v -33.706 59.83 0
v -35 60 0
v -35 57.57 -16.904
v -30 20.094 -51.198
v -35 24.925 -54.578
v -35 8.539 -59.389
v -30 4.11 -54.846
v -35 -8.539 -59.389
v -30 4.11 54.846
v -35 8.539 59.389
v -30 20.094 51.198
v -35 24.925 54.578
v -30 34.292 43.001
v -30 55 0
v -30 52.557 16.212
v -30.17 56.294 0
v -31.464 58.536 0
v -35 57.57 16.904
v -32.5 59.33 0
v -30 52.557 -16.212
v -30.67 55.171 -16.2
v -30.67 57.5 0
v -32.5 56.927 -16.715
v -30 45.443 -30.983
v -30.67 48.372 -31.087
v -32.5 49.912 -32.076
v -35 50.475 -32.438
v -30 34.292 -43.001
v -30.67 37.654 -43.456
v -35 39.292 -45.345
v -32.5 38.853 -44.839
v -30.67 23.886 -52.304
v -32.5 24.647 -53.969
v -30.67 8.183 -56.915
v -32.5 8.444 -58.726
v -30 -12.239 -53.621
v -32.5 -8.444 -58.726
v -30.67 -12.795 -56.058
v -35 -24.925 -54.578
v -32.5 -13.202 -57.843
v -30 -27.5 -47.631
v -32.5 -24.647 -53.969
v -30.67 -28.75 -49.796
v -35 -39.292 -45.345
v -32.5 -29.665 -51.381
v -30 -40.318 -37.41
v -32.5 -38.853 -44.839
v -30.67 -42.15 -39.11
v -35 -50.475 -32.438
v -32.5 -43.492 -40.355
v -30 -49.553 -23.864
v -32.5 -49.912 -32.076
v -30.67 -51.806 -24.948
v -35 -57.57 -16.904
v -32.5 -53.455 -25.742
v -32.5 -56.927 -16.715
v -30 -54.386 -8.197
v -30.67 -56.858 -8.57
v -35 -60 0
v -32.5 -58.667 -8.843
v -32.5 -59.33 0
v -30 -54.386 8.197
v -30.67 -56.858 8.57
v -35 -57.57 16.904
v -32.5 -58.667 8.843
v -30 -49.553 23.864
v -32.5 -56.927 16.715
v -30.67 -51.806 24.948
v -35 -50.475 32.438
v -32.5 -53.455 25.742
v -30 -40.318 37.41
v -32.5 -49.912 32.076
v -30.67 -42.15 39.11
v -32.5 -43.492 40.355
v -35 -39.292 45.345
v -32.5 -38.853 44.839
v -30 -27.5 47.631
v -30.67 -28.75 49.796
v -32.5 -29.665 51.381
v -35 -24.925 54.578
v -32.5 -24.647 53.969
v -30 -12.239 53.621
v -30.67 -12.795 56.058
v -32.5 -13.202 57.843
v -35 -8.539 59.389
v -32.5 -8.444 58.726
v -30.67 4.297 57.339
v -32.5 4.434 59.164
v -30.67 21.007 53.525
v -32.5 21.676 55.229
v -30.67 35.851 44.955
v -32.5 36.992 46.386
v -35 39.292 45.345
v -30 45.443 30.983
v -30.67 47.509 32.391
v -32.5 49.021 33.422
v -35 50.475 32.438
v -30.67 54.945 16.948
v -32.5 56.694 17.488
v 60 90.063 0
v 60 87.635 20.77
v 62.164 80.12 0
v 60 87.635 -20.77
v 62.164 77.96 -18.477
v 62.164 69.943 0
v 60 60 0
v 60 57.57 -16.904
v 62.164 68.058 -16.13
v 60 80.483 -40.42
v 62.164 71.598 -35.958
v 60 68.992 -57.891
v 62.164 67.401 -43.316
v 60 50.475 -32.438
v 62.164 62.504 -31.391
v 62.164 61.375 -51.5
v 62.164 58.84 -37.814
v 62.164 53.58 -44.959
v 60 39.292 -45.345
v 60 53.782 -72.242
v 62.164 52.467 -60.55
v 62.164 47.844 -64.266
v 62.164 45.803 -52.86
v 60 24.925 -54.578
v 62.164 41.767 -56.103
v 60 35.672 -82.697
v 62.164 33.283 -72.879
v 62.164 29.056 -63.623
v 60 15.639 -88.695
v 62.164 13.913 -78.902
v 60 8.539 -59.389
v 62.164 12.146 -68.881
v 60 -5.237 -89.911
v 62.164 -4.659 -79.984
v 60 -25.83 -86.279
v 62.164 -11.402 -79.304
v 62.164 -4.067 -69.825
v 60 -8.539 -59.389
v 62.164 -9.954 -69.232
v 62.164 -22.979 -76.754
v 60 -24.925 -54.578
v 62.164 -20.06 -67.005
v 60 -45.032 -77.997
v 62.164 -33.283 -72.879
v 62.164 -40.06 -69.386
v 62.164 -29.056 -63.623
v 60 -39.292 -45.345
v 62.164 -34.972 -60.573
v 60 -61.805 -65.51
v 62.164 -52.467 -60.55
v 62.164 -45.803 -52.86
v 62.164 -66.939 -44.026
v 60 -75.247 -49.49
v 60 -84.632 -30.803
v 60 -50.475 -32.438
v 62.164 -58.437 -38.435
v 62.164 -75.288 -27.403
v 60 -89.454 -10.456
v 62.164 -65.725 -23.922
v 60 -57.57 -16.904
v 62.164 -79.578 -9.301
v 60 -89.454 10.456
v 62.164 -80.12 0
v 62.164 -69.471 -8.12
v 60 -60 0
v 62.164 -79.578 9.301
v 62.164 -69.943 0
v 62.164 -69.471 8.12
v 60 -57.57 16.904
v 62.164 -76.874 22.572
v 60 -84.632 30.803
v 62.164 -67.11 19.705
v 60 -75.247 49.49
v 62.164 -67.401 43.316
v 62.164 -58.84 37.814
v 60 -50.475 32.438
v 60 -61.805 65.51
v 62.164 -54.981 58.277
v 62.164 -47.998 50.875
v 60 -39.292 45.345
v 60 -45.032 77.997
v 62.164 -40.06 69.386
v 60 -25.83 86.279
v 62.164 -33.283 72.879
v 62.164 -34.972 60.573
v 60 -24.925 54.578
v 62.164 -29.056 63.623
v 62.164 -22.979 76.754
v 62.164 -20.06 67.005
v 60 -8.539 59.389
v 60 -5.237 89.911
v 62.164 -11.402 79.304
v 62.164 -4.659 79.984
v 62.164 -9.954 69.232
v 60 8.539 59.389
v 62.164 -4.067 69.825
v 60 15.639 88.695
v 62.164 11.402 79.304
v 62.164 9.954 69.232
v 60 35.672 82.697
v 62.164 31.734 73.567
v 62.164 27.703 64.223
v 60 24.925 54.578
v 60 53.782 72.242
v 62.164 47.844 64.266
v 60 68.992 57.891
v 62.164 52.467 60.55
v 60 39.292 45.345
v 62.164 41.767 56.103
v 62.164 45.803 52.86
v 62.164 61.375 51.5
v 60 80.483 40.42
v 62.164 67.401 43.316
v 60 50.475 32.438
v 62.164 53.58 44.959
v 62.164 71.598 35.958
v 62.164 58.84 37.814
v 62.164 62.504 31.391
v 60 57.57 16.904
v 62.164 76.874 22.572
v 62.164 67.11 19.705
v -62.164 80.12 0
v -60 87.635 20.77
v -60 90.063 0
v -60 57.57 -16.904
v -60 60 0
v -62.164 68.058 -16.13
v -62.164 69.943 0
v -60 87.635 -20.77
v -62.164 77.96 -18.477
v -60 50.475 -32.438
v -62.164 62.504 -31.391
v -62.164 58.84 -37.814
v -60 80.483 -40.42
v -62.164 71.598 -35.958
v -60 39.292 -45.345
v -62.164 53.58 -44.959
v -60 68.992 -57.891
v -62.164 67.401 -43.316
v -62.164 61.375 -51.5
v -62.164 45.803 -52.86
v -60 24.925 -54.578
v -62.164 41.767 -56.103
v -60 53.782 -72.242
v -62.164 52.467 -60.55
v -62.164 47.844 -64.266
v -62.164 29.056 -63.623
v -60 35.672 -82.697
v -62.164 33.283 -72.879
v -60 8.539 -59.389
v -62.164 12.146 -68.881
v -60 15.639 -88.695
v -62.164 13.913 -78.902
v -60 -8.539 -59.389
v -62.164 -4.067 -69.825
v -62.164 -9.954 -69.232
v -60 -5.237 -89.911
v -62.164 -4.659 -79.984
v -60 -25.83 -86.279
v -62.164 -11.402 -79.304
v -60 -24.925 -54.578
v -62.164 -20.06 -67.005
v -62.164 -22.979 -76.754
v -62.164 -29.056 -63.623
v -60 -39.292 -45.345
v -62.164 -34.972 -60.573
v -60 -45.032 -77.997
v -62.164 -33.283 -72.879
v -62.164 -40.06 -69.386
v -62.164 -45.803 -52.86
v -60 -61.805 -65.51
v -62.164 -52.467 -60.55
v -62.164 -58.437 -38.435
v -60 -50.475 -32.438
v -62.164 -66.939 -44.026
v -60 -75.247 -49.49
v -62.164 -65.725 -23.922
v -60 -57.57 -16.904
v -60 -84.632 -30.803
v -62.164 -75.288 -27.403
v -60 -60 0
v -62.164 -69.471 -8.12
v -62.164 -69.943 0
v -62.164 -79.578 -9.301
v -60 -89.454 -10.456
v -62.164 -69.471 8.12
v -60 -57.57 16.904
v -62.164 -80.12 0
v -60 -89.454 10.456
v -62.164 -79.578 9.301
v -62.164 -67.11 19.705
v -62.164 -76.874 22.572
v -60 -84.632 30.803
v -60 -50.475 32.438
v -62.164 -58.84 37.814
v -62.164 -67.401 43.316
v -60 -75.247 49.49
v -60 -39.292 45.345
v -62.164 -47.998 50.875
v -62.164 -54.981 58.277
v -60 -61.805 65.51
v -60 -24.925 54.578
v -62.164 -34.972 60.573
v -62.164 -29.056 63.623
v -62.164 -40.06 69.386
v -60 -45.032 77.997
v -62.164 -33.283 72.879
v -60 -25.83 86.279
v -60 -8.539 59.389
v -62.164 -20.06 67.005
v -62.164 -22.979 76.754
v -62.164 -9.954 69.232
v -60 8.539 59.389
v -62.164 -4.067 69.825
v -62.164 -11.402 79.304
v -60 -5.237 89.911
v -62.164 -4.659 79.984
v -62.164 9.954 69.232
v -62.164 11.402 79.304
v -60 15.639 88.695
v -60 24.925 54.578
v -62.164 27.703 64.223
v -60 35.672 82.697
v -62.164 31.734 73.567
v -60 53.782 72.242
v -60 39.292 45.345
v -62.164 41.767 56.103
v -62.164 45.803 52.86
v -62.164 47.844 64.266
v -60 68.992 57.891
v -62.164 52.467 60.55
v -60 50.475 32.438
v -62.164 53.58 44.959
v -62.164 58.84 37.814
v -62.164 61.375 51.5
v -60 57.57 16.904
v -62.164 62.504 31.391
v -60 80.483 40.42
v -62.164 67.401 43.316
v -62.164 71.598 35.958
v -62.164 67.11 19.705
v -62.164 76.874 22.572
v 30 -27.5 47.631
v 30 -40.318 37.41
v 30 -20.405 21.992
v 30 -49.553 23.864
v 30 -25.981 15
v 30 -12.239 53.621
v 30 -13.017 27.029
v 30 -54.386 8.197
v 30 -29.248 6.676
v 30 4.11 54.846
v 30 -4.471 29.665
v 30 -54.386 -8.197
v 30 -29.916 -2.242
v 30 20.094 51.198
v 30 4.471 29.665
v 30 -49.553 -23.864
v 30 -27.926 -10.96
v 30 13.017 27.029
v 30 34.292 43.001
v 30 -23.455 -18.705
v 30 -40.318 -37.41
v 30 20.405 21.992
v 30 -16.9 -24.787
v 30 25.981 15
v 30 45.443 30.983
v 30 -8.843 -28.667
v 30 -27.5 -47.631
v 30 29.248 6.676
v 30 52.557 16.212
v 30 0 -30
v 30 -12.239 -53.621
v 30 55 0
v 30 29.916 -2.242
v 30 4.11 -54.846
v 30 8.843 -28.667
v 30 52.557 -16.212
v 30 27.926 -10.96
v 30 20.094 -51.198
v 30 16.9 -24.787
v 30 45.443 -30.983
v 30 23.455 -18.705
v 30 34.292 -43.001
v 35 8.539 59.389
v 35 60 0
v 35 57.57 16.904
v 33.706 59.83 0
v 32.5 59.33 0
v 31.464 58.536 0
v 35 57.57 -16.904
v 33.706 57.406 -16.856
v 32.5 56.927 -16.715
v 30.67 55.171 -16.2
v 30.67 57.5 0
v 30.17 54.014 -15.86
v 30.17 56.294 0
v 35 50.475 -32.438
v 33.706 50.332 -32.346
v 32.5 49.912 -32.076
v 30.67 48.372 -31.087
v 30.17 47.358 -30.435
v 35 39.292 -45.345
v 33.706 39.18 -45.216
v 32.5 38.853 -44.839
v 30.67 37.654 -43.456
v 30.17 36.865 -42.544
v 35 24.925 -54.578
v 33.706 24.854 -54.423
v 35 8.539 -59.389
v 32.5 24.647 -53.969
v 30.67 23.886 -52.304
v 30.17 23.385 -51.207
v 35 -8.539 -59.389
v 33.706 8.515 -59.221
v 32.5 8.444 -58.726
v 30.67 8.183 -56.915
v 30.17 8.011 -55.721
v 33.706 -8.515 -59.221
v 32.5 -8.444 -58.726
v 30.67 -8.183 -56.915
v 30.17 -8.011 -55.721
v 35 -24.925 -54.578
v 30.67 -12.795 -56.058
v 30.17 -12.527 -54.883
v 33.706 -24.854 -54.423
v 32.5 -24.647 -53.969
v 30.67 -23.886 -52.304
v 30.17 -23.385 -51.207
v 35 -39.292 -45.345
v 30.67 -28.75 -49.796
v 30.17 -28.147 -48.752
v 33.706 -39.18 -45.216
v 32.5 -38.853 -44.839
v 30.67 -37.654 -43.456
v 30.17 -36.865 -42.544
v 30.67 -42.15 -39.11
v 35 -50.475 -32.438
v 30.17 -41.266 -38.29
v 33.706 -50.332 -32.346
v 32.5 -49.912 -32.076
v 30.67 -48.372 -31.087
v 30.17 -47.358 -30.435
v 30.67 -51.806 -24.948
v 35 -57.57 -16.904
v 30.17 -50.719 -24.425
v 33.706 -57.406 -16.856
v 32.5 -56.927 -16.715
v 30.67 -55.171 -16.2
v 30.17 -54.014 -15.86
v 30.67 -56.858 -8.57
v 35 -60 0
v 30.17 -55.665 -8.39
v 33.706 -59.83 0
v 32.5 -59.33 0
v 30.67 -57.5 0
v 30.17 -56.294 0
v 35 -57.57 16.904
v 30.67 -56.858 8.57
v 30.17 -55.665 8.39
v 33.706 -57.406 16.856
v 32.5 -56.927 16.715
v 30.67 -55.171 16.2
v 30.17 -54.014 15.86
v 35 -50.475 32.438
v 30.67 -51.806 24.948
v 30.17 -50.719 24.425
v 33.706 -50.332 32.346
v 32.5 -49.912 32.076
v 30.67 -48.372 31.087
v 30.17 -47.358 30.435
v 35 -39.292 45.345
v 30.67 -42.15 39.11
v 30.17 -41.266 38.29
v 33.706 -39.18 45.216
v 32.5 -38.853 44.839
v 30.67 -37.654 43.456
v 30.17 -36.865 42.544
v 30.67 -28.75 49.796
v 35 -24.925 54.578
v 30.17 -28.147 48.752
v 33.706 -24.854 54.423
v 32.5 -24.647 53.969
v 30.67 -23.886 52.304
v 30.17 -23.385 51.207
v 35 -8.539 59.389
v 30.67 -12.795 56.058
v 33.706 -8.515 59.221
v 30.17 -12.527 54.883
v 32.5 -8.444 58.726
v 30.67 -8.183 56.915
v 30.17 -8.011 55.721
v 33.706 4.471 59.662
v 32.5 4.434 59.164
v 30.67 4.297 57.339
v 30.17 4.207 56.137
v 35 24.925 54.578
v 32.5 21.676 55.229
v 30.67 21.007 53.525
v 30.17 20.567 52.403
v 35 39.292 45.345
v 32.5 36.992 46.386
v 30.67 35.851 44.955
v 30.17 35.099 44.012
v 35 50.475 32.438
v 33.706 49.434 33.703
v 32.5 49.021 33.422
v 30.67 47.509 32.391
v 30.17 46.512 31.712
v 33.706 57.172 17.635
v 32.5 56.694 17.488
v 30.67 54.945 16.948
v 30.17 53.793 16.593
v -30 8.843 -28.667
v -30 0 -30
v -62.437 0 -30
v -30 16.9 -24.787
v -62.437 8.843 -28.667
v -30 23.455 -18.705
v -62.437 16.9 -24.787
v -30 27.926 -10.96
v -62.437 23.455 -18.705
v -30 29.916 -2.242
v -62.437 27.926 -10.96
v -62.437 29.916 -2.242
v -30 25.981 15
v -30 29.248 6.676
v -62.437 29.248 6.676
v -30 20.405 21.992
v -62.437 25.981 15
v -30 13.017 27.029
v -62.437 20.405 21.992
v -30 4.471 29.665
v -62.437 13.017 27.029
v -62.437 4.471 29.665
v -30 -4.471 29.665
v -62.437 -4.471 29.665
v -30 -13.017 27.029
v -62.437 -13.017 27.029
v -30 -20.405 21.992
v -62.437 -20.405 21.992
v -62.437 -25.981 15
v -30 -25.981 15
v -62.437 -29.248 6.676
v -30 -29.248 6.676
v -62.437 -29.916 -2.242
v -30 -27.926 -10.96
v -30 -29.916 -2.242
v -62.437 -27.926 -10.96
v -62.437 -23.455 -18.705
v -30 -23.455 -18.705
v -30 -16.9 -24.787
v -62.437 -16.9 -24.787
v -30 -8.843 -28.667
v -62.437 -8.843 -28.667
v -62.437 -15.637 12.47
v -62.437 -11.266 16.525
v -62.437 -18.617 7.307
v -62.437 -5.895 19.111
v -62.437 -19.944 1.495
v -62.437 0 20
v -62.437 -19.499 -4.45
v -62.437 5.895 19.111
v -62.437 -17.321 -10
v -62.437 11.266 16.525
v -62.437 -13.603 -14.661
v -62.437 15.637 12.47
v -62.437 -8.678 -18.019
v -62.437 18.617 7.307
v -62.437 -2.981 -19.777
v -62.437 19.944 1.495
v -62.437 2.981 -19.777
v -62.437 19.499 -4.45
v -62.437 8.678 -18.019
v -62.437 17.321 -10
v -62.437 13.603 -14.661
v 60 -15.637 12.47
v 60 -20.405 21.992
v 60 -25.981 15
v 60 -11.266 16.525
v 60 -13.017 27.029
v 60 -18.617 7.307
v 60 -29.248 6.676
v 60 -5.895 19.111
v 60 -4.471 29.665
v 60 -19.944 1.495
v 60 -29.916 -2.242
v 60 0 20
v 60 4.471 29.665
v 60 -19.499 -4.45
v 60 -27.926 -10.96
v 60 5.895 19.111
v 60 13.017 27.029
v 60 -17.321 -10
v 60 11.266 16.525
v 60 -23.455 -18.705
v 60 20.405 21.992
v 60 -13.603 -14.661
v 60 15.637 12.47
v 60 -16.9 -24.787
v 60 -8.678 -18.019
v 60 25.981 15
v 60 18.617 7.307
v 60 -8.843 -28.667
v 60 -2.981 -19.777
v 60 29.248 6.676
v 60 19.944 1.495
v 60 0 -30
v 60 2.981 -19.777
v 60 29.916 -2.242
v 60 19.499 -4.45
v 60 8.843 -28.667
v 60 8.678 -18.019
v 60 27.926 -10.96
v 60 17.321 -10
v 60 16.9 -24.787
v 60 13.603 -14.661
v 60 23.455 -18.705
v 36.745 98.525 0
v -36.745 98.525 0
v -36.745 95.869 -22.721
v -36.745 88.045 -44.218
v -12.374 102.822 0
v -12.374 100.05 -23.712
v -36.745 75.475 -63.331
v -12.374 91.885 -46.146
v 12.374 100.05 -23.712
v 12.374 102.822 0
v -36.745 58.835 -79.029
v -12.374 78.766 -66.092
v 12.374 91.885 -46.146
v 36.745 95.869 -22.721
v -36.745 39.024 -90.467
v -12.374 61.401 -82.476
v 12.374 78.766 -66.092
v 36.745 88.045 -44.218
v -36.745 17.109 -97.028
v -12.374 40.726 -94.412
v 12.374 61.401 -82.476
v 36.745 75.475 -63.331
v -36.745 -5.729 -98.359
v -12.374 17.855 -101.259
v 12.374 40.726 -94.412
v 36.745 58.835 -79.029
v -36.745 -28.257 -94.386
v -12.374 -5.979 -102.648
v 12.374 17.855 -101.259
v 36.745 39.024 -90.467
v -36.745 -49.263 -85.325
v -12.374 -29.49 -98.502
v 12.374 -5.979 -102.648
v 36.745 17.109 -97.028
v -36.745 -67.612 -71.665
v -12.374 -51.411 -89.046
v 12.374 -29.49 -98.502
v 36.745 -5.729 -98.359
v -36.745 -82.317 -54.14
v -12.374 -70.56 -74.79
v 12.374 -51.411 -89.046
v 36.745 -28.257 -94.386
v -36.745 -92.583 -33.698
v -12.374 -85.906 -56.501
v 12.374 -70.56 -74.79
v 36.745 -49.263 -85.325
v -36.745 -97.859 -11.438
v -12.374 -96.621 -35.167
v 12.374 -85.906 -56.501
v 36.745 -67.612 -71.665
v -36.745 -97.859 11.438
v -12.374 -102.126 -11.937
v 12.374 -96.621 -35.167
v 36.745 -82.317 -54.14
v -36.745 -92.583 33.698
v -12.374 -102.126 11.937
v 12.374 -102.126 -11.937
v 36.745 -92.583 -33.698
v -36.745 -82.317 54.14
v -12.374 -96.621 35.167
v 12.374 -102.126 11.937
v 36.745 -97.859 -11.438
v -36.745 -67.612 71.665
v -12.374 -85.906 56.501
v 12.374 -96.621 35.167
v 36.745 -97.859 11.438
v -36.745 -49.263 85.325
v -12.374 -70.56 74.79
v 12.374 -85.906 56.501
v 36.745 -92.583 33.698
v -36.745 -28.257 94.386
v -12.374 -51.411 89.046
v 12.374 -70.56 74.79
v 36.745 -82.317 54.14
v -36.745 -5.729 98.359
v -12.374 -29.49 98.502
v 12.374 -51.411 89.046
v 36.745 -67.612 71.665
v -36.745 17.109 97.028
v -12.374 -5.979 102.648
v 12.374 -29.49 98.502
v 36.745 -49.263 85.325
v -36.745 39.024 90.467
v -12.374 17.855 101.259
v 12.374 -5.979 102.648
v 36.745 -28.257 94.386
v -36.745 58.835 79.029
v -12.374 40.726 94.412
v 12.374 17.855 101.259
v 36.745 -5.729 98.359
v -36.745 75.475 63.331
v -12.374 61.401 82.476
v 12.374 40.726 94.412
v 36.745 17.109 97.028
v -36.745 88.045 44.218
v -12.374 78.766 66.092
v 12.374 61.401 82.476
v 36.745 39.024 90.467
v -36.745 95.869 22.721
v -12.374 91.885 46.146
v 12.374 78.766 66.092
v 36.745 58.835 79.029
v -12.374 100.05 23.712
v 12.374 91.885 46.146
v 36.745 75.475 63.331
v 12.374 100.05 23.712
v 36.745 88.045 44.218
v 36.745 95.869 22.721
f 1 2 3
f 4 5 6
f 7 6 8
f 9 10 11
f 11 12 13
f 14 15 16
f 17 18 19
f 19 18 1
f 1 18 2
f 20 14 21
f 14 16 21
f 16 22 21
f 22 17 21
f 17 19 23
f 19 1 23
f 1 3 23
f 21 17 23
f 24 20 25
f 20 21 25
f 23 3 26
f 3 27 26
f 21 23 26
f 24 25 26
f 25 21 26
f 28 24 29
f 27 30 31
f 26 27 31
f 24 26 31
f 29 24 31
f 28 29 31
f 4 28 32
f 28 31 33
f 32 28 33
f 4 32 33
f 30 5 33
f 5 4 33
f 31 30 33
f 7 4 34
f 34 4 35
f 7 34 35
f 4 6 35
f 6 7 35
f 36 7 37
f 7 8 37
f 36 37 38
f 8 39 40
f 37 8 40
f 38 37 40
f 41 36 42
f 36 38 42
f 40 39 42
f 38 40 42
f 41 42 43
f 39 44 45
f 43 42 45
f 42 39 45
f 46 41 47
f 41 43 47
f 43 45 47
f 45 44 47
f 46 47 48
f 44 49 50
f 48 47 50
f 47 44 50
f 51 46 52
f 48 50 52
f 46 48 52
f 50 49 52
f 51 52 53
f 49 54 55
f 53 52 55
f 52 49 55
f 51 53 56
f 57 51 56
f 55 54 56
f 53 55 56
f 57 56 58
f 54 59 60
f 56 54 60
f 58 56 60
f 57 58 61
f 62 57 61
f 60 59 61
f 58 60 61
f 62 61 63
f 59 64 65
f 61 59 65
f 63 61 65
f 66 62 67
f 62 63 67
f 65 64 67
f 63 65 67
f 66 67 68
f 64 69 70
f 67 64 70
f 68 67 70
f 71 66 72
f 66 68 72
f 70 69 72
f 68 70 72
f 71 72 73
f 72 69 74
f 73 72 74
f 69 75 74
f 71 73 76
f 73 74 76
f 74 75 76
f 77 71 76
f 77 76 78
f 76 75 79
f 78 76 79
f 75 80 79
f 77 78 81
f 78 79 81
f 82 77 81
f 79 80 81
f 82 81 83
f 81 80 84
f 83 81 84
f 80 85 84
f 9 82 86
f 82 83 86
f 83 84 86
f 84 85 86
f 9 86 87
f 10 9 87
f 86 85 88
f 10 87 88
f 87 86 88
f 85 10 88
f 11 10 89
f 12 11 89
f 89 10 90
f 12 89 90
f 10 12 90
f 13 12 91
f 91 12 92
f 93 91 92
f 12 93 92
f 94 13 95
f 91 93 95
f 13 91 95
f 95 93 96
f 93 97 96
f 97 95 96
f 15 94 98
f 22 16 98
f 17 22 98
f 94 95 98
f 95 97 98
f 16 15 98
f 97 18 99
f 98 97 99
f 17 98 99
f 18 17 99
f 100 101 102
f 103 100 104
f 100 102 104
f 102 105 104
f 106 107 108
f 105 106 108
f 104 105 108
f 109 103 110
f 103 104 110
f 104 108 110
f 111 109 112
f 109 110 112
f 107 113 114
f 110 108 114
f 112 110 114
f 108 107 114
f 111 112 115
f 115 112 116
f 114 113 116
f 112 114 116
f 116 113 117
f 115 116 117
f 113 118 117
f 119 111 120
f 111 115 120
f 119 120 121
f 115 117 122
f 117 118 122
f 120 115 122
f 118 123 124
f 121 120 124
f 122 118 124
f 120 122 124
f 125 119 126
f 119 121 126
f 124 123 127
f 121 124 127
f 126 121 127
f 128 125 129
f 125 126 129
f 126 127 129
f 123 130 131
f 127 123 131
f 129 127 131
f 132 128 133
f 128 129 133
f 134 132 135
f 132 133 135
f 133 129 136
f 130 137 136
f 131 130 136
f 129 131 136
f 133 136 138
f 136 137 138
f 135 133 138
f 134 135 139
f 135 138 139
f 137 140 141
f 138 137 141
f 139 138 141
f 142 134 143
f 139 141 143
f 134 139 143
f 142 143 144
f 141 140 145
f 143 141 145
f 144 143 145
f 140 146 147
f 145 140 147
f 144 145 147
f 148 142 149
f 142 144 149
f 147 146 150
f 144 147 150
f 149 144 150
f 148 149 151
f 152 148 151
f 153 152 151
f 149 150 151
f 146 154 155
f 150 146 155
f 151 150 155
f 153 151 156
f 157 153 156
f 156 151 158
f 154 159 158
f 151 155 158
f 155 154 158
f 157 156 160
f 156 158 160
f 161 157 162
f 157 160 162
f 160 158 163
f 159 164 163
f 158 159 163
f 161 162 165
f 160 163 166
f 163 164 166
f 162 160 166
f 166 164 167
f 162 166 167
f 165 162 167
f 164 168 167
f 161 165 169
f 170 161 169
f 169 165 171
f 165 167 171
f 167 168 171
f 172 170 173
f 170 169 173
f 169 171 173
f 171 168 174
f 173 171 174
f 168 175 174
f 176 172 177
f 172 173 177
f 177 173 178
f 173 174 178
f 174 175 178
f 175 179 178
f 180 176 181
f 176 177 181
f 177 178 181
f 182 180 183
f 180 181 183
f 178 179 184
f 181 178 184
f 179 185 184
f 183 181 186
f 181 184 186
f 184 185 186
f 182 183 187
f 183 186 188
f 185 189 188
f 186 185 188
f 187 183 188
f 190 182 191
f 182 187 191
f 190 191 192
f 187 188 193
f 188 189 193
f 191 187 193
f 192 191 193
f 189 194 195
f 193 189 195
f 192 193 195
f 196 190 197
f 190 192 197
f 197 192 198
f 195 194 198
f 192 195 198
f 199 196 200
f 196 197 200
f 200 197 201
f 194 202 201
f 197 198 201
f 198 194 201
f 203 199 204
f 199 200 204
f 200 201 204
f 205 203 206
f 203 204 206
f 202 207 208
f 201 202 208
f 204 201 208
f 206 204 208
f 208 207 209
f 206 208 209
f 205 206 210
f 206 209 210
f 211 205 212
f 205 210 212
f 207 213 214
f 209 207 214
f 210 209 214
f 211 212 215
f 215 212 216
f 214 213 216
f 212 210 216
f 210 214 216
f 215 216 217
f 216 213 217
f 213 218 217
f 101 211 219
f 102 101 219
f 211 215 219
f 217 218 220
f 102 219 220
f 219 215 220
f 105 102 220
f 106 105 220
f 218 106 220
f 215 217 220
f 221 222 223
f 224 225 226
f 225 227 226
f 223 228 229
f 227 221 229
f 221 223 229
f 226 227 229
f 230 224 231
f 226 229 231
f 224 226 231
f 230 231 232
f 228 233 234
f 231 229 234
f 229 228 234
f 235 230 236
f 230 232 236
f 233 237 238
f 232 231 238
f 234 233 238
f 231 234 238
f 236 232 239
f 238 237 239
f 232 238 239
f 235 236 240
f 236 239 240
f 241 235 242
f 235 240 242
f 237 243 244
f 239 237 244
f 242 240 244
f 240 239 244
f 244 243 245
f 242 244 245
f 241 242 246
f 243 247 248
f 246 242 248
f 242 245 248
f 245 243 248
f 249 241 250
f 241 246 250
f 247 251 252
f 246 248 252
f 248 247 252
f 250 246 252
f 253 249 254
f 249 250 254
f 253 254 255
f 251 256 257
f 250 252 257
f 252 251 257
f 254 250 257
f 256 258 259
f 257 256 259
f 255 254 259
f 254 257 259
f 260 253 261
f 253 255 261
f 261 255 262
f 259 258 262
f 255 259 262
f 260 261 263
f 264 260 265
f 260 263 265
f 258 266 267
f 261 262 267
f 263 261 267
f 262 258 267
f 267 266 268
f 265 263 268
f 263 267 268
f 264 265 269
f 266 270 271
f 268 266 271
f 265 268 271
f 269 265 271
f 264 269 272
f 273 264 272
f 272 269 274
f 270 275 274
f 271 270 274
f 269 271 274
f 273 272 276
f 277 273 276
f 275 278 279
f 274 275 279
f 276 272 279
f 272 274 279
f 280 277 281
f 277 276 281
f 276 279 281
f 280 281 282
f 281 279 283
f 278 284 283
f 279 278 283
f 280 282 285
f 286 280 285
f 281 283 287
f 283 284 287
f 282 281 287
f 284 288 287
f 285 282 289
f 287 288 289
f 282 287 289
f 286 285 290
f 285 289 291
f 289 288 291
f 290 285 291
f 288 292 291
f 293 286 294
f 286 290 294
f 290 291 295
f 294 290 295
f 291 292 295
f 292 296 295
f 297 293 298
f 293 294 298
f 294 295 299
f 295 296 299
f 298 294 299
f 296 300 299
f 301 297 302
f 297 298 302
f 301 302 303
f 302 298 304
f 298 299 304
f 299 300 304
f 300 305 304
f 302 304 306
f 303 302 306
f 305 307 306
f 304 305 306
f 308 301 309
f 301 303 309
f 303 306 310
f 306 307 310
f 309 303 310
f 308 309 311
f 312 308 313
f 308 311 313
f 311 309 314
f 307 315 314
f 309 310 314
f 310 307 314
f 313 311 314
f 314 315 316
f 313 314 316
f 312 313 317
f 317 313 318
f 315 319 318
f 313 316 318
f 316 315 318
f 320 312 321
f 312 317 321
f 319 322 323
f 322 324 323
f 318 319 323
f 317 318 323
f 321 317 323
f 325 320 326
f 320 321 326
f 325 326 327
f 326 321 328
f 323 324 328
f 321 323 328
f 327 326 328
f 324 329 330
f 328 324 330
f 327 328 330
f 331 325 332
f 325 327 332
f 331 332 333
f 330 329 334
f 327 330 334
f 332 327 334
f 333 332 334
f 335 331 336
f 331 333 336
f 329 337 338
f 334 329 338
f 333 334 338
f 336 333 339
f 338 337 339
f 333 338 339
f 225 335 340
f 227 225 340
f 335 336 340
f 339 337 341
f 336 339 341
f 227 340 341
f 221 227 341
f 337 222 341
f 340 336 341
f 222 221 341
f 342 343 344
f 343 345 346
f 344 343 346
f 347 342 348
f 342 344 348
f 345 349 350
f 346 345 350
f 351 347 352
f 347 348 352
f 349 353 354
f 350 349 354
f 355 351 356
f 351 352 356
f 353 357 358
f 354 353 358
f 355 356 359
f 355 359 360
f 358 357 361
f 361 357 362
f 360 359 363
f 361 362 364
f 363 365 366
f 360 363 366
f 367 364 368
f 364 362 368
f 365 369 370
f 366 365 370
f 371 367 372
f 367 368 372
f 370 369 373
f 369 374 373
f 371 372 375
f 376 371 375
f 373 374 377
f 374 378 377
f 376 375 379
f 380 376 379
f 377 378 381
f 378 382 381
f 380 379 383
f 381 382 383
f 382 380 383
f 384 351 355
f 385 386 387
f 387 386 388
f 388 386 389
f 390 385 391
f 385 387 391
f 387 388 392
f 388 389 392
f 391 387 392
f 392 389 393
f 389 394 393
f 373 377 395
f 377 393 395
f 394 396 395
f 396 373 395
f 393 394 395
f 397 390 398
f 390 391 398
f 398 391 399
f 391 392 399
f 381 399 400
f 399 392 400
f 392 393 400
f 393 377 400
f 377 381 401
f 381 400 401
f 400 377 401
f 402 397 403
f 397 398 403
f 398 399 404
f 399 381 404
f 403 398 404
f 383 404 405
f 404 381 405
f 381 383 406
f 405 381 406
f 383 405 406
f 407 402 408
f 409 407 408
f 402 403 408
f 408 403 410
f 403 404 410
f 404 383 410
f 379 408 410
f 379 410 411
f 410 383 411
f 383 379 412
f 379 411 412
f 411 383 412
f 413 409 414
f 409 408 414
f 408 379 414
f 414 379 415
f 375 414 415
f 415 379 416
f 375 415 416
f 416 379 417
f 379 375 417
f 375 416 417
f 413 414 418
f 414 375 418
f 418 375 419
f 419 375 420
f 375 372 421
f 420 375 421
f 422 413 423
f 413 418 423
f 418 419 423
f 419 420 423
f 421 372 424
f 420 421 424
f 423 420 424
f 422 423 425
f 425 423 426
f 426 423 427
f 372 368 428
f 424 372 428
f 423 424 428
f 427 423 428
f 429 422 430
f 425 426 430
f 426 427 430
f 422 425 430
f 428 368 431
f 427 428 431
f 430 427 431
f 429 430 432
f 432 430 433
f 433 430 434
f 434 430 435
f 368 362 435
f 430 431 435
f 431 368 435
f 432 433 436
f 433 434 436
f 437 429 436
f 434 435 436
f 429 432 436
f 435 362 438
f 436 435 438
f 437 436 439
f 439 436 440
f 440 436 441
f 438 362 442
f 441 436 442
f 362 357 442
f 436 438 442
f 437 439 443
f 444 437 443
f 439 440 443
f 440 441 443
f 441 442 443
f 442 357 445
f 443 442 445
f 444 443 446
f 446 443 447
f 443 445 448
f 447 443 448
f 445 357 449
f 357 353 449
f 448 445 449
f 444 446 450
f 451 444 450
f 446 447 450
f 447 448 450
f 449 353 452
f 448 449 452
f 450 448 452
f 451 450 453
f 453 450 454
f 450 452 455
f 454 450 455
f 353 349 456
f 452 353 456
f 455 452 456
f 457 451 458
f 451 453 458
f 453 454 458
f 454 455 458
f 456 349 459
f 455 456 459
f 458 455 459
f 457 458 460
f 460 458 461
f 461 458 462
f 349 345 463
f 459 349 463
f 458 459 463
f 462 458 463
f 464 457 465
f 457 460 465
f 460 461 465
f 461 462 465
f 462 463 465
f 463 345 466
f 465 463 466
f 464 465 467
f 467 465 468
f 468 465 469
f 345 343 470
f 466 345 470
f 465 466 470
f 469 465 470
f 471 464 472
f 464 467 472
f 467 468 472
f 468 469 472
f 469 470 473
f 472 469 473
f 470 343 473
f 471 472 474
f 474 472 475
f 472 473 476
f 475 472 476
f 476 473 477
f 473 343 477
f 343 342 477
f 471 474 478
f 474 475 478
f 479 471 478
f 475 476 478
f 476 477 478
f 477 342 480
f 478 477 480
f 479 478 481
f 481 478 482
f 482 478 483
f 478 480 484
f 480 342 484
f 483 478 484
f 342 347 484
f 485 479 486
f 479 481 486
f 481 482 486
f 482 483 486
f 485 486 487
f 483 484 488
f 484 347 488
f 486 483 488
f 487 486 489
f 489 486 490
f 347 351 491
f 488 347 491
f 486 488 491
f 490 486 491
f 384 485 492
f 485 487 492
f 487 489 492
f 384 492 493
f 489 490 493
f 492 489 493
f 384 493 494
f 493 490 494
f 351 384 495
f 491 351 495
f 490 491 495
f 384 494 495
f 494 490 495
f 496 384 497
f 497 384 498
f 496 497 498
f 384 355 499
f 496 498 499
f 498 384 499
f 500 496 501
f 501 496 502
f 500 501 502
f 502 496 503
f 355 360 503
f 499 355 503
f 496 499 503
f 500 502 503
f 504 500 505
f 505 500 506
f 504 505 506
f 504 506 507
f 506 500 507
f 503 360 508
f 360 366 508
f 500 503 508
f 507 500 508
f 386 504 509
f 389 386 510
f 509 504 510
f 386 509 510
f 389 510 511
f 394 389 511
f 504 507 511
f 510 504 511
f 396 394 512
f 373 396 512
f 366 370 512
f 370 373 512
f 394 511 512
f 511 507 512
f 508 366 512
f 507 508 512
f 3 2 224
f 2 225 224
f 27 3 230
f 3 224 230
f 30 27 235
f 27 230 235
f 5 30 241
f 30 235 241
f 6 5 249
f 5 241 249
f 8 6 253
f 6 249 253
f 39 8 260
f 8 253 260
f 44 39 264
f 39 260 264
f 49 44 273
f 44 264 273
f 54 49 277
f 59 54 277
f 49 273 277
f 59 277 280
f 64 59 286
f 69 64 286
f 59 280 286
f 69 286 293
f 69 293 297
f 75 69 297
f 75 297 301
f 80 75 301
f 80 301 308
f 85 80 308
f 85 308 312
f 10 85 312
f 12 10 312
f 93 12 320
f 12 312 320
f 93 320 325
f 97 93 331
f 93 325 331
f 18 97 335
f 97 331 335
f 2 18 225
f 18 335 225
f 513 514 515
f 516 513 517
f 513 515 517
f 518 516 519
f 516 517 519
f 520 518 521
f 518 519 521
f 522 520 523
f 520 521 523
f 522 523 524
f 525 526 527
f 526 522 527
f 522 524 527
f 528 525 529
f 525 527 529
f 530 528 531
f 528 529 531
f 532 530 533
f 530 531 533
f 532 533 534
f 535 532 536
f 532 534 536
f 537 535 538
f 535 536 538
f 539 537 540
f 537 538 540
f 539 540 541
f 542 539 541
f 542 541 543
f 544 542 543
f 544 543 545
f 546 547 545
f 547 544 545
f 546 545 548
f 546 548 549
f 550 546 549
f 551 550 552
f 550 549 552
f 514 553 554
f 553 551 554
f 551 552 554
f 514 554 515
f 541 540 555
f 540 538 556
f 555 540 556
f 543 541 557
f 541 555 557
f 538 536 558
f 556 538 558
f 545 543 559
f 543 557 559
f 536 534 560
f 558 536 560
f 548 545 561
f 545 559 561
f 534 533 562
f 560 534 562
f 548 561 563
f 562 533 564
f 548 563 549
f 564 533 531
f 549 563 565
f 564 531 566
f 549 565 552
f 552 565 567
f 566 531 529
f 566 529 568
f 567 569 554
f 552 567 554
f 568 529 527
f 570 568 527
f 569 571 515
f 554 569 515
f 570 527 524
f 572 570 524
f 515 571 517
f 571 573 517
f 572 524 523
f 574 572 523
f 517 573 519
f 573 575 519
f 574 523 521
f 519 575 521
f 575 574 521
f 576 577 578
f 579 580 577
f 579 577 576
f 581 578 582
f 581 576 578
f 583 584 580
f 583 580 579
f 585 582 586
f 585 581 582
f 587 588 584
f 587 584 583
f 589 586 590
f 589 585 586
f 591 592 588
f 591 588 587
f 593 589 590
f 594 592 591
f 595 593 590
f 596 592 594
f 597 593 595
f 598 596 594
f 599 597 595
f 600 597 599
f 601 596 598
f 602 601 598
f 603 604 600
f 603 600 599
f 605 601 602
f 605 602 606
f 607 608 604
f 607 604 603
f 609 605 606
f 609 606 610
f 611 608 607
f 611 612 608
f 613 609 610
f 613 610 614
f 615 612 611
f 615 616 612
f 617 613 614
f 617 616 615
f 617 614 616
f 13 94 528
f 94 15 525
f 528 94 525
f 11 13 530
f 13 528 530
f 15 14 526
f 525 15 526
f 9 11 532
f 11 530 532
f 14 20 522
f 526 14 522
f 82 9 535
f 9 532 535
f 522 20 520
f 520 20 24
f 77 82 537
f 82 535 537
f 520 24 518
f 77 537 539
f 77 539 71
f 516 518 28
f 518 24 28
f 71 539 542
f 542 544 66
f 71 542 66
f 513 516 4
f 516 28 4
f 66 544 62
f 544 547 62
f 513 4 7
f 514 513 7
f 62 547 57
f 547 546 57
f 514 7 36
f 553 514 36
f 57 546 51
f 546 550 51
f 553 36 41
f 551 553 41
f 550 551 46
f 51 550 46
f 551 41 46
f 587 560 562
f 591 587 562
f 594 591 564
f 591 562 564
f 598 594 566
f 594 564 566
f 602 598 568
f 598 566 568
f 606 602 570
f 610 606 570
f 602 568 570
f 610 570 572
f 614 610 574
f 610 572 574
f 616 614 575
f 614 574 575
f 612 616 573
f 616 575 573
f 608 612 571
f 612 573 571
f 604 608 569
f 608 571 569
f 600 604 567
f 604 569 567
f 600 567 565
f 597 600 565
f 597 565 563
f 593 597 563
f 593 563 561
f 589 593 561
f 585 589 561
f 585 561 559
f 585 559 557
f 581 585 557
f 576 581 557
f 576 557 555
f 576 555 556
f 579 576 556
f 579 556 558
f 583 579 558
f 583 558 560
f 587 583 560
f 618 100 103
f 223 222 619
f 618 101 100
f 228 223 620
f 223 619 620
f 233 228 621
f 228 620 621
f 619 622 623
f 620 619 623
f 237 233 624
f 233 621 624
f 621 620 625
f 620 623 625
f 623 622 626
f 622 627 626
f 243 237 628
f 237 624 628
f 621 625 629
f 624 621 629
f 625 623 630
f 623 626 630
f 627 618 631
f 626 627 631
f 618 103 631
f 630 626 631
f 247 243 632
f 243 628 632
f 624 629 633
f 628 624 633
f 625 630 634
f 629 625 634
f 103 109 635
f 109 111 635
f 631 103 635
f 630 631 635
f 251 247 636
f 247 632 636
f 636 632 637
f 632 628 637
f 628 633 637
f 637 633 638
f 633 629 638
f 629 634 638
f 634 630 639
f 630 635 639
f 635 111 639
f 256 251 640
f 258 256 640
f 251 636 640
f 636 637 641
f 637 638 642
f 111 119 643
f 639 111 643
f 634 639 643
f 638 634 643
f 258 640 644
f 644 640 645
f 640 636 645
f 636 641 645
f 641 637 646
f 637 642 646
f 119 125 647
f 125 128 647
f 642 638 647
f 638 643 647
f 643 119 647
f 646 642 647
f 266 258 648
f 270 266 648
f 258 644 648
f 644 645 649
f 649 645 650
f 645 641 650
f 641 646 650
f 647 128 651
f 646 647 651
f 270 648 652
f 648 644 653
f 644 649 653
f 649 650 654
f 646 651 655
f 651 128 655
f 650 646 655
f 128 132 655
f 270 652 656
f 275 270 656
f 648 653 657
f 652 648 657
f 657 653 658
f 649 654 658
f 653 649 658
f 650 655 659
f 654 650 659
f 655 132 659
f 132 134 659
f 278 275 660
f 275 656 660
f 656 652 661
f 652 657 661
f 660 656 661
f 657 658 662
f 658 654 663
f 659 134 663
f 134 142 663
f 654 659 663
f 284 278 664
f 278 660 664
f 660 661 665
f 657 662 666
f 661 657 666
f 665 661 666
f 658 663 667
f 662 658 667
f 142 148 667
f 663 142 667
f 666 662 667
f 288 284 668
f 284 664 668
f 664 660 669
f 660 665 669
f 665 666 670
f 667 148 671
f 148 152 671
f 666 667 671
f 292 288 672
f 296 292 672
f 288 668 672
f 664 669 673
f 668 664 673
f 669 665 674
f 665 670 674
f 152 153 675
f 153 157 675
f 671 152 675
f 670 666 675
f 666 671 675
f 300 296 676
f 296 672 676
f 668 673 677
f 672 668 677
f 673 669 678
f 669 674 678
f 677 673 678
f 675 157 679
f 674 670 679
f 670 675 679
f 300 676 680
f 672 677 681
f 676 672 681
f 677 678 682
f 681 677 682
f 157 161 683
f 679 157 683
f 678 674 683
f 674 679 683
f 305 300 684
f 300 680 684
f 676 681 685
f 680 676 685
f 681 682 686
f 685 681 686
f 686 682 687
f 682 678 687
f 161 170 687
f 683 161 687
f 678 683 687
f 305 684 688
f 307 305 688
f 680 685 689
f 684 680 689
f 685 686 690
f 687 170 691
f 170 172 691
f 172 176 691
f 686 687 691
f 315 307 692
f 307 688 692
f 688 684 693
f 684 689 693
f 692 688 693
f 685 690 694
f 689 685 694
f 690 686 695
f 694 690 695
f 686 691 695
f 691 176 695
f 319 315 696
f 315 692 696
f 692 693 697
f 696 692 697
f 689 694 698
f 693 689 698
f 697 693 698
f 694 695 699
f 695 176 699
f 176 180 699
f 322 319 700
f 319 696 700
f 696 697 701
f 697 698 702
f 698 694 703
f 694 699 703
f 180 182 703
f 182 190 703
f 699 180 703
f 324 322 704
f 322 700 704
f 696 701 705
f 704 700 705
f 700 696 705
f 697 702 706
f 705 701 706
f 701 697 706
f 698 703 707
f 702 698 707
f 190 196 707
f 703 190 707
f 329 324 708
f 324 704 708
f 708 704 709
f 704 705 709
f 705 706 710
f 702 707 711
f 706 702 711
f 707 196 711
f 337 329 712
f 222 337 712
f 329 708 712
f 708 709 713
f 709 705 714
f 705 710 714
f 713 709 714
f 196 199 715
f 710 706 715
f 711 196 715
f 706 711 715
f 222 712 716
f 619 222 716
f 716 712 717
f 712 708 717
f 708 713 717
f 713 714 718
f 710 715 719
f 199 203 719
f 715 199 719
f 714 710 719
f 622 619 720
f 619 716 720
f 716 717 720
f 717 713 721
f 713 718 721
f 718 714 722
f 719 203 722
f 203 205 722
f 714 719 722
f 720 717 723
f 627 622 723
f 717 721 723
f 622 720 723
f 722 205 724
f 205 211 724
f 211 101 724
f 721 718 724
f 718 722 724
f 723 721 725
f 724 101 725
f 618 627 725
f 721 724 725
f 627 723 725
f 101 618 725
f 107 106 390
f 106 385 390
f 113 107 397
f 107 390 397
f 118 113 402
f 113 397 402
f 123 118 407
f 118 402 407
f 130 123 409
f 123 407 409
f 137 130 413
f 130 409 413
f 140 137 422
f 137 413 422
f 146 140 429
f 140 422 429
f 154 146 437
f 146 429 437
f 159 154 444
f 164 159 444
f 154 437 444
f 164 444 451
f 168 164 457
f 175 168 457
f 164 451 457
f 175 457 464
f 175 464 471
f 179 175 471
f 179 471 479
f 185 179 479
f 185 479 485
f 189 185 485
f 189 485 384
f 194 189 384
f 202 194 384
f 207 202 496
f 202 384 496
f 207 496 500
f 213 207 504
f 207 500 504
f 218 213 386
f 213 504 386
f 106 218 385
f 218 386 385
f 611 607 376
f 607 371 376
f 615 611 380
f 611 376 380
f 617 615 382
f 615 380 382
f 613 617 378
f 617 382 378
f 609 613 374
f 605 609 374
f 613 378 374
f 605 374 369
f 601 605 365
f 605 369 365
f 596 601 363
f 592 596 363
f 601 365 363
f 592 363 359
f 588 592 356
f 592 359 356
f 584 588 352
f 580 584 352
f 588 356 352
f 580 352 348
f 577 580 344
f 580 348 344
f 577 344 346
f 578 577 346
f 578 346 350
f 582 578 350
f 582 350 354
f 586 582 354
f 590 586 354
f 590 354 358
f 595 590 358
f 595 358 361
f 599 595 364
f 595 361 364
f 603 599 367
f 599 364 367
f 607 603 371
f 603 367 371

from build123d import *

# Parameters (mm, degrees)
BOSS_EXTRUDE1_START = -112.436685
SKETCH2_R           = 30
BOSS_EXTRUDE1_DEPTH = 112.436685
SKETCH3_R           = 30
BOSS_EXTRUDE2_DEPTH = 10
SKETCH4_R           = 20
CUT_EXTRUDE1_DEPTH  = 125.873370497


with BuildPart() as part:
    # Sketch1 → Revolve1 (revolve)
    with BuildSketch(Plane.XY):
        with BuildLine():
            Line((0, 0), (-50, 0))
            Line((-50, 0), (-50, 10))
            Line((-50, 10), (-30, 10))
            Line((-30, 10), (-30, 55))
            ThreePointArc((-30, 55), (-31.464466094, 58.535533906), (-35, 60))
            Line((-35, 60), (-60, 60))
            ThreePointArc((-60, 60), (-62.436685199, 75.031545588), (-60, 90.063091176))
            ThreePointArc((-60, 90.063091176), (0, 103.36161645), (60, 90.063091176))
            ThreePointArc((60, 90.063091176), (62.436685199, 75.031545588), (60, 60))
            Line((60, 60), (35, 60))
            ThreePointArc((35, 60), (31.464466094, 58.535533906), (30, 55))
            Line((30, 55), (30, 10))
            Line((30, 10), (50, 10))
            Line((50, 10), (50, 0))
            Line((50, 0), (0, 0))
        make_face()
    revolve(axis=Axis((0, 0, 0), (-1, 0, 0)))

    # Sketch2 → Boss-Extrude1 (add)
    with BuildSketch(Plane(origin=(50, 0, 0), x_dir=(0, 0, -1), z_dir=(1, 0, 0)).offset(BOSS_EXTRUDE1_START)):
        Circle(SKETCH2_R)
    extrude(amount=BOSS_EXTRUDE1_DEPTH)

    # Sketch3 → Boss-Extrude2 (add)
    with BuildSketch(Plane(origin=(50, 0, 0), x_dir=(0, 0, -1), z_dir=(1, 0, 0))):
        Circle(SKETCH3_R)
    extrude(amount=BOSS_EXTRUDE2_DEPTH)

    # Sketch4 → Cut-Extrude1 (cut, through all)
    with BuildSketch(Plane.ZY.offset(62.436685199)):
        Circle(SKETCH4_R)
    extrude(amount=-CUT_EXTRUDE1_DEPTH, mode=Mode.SUBTRACT)


solid = part.part
